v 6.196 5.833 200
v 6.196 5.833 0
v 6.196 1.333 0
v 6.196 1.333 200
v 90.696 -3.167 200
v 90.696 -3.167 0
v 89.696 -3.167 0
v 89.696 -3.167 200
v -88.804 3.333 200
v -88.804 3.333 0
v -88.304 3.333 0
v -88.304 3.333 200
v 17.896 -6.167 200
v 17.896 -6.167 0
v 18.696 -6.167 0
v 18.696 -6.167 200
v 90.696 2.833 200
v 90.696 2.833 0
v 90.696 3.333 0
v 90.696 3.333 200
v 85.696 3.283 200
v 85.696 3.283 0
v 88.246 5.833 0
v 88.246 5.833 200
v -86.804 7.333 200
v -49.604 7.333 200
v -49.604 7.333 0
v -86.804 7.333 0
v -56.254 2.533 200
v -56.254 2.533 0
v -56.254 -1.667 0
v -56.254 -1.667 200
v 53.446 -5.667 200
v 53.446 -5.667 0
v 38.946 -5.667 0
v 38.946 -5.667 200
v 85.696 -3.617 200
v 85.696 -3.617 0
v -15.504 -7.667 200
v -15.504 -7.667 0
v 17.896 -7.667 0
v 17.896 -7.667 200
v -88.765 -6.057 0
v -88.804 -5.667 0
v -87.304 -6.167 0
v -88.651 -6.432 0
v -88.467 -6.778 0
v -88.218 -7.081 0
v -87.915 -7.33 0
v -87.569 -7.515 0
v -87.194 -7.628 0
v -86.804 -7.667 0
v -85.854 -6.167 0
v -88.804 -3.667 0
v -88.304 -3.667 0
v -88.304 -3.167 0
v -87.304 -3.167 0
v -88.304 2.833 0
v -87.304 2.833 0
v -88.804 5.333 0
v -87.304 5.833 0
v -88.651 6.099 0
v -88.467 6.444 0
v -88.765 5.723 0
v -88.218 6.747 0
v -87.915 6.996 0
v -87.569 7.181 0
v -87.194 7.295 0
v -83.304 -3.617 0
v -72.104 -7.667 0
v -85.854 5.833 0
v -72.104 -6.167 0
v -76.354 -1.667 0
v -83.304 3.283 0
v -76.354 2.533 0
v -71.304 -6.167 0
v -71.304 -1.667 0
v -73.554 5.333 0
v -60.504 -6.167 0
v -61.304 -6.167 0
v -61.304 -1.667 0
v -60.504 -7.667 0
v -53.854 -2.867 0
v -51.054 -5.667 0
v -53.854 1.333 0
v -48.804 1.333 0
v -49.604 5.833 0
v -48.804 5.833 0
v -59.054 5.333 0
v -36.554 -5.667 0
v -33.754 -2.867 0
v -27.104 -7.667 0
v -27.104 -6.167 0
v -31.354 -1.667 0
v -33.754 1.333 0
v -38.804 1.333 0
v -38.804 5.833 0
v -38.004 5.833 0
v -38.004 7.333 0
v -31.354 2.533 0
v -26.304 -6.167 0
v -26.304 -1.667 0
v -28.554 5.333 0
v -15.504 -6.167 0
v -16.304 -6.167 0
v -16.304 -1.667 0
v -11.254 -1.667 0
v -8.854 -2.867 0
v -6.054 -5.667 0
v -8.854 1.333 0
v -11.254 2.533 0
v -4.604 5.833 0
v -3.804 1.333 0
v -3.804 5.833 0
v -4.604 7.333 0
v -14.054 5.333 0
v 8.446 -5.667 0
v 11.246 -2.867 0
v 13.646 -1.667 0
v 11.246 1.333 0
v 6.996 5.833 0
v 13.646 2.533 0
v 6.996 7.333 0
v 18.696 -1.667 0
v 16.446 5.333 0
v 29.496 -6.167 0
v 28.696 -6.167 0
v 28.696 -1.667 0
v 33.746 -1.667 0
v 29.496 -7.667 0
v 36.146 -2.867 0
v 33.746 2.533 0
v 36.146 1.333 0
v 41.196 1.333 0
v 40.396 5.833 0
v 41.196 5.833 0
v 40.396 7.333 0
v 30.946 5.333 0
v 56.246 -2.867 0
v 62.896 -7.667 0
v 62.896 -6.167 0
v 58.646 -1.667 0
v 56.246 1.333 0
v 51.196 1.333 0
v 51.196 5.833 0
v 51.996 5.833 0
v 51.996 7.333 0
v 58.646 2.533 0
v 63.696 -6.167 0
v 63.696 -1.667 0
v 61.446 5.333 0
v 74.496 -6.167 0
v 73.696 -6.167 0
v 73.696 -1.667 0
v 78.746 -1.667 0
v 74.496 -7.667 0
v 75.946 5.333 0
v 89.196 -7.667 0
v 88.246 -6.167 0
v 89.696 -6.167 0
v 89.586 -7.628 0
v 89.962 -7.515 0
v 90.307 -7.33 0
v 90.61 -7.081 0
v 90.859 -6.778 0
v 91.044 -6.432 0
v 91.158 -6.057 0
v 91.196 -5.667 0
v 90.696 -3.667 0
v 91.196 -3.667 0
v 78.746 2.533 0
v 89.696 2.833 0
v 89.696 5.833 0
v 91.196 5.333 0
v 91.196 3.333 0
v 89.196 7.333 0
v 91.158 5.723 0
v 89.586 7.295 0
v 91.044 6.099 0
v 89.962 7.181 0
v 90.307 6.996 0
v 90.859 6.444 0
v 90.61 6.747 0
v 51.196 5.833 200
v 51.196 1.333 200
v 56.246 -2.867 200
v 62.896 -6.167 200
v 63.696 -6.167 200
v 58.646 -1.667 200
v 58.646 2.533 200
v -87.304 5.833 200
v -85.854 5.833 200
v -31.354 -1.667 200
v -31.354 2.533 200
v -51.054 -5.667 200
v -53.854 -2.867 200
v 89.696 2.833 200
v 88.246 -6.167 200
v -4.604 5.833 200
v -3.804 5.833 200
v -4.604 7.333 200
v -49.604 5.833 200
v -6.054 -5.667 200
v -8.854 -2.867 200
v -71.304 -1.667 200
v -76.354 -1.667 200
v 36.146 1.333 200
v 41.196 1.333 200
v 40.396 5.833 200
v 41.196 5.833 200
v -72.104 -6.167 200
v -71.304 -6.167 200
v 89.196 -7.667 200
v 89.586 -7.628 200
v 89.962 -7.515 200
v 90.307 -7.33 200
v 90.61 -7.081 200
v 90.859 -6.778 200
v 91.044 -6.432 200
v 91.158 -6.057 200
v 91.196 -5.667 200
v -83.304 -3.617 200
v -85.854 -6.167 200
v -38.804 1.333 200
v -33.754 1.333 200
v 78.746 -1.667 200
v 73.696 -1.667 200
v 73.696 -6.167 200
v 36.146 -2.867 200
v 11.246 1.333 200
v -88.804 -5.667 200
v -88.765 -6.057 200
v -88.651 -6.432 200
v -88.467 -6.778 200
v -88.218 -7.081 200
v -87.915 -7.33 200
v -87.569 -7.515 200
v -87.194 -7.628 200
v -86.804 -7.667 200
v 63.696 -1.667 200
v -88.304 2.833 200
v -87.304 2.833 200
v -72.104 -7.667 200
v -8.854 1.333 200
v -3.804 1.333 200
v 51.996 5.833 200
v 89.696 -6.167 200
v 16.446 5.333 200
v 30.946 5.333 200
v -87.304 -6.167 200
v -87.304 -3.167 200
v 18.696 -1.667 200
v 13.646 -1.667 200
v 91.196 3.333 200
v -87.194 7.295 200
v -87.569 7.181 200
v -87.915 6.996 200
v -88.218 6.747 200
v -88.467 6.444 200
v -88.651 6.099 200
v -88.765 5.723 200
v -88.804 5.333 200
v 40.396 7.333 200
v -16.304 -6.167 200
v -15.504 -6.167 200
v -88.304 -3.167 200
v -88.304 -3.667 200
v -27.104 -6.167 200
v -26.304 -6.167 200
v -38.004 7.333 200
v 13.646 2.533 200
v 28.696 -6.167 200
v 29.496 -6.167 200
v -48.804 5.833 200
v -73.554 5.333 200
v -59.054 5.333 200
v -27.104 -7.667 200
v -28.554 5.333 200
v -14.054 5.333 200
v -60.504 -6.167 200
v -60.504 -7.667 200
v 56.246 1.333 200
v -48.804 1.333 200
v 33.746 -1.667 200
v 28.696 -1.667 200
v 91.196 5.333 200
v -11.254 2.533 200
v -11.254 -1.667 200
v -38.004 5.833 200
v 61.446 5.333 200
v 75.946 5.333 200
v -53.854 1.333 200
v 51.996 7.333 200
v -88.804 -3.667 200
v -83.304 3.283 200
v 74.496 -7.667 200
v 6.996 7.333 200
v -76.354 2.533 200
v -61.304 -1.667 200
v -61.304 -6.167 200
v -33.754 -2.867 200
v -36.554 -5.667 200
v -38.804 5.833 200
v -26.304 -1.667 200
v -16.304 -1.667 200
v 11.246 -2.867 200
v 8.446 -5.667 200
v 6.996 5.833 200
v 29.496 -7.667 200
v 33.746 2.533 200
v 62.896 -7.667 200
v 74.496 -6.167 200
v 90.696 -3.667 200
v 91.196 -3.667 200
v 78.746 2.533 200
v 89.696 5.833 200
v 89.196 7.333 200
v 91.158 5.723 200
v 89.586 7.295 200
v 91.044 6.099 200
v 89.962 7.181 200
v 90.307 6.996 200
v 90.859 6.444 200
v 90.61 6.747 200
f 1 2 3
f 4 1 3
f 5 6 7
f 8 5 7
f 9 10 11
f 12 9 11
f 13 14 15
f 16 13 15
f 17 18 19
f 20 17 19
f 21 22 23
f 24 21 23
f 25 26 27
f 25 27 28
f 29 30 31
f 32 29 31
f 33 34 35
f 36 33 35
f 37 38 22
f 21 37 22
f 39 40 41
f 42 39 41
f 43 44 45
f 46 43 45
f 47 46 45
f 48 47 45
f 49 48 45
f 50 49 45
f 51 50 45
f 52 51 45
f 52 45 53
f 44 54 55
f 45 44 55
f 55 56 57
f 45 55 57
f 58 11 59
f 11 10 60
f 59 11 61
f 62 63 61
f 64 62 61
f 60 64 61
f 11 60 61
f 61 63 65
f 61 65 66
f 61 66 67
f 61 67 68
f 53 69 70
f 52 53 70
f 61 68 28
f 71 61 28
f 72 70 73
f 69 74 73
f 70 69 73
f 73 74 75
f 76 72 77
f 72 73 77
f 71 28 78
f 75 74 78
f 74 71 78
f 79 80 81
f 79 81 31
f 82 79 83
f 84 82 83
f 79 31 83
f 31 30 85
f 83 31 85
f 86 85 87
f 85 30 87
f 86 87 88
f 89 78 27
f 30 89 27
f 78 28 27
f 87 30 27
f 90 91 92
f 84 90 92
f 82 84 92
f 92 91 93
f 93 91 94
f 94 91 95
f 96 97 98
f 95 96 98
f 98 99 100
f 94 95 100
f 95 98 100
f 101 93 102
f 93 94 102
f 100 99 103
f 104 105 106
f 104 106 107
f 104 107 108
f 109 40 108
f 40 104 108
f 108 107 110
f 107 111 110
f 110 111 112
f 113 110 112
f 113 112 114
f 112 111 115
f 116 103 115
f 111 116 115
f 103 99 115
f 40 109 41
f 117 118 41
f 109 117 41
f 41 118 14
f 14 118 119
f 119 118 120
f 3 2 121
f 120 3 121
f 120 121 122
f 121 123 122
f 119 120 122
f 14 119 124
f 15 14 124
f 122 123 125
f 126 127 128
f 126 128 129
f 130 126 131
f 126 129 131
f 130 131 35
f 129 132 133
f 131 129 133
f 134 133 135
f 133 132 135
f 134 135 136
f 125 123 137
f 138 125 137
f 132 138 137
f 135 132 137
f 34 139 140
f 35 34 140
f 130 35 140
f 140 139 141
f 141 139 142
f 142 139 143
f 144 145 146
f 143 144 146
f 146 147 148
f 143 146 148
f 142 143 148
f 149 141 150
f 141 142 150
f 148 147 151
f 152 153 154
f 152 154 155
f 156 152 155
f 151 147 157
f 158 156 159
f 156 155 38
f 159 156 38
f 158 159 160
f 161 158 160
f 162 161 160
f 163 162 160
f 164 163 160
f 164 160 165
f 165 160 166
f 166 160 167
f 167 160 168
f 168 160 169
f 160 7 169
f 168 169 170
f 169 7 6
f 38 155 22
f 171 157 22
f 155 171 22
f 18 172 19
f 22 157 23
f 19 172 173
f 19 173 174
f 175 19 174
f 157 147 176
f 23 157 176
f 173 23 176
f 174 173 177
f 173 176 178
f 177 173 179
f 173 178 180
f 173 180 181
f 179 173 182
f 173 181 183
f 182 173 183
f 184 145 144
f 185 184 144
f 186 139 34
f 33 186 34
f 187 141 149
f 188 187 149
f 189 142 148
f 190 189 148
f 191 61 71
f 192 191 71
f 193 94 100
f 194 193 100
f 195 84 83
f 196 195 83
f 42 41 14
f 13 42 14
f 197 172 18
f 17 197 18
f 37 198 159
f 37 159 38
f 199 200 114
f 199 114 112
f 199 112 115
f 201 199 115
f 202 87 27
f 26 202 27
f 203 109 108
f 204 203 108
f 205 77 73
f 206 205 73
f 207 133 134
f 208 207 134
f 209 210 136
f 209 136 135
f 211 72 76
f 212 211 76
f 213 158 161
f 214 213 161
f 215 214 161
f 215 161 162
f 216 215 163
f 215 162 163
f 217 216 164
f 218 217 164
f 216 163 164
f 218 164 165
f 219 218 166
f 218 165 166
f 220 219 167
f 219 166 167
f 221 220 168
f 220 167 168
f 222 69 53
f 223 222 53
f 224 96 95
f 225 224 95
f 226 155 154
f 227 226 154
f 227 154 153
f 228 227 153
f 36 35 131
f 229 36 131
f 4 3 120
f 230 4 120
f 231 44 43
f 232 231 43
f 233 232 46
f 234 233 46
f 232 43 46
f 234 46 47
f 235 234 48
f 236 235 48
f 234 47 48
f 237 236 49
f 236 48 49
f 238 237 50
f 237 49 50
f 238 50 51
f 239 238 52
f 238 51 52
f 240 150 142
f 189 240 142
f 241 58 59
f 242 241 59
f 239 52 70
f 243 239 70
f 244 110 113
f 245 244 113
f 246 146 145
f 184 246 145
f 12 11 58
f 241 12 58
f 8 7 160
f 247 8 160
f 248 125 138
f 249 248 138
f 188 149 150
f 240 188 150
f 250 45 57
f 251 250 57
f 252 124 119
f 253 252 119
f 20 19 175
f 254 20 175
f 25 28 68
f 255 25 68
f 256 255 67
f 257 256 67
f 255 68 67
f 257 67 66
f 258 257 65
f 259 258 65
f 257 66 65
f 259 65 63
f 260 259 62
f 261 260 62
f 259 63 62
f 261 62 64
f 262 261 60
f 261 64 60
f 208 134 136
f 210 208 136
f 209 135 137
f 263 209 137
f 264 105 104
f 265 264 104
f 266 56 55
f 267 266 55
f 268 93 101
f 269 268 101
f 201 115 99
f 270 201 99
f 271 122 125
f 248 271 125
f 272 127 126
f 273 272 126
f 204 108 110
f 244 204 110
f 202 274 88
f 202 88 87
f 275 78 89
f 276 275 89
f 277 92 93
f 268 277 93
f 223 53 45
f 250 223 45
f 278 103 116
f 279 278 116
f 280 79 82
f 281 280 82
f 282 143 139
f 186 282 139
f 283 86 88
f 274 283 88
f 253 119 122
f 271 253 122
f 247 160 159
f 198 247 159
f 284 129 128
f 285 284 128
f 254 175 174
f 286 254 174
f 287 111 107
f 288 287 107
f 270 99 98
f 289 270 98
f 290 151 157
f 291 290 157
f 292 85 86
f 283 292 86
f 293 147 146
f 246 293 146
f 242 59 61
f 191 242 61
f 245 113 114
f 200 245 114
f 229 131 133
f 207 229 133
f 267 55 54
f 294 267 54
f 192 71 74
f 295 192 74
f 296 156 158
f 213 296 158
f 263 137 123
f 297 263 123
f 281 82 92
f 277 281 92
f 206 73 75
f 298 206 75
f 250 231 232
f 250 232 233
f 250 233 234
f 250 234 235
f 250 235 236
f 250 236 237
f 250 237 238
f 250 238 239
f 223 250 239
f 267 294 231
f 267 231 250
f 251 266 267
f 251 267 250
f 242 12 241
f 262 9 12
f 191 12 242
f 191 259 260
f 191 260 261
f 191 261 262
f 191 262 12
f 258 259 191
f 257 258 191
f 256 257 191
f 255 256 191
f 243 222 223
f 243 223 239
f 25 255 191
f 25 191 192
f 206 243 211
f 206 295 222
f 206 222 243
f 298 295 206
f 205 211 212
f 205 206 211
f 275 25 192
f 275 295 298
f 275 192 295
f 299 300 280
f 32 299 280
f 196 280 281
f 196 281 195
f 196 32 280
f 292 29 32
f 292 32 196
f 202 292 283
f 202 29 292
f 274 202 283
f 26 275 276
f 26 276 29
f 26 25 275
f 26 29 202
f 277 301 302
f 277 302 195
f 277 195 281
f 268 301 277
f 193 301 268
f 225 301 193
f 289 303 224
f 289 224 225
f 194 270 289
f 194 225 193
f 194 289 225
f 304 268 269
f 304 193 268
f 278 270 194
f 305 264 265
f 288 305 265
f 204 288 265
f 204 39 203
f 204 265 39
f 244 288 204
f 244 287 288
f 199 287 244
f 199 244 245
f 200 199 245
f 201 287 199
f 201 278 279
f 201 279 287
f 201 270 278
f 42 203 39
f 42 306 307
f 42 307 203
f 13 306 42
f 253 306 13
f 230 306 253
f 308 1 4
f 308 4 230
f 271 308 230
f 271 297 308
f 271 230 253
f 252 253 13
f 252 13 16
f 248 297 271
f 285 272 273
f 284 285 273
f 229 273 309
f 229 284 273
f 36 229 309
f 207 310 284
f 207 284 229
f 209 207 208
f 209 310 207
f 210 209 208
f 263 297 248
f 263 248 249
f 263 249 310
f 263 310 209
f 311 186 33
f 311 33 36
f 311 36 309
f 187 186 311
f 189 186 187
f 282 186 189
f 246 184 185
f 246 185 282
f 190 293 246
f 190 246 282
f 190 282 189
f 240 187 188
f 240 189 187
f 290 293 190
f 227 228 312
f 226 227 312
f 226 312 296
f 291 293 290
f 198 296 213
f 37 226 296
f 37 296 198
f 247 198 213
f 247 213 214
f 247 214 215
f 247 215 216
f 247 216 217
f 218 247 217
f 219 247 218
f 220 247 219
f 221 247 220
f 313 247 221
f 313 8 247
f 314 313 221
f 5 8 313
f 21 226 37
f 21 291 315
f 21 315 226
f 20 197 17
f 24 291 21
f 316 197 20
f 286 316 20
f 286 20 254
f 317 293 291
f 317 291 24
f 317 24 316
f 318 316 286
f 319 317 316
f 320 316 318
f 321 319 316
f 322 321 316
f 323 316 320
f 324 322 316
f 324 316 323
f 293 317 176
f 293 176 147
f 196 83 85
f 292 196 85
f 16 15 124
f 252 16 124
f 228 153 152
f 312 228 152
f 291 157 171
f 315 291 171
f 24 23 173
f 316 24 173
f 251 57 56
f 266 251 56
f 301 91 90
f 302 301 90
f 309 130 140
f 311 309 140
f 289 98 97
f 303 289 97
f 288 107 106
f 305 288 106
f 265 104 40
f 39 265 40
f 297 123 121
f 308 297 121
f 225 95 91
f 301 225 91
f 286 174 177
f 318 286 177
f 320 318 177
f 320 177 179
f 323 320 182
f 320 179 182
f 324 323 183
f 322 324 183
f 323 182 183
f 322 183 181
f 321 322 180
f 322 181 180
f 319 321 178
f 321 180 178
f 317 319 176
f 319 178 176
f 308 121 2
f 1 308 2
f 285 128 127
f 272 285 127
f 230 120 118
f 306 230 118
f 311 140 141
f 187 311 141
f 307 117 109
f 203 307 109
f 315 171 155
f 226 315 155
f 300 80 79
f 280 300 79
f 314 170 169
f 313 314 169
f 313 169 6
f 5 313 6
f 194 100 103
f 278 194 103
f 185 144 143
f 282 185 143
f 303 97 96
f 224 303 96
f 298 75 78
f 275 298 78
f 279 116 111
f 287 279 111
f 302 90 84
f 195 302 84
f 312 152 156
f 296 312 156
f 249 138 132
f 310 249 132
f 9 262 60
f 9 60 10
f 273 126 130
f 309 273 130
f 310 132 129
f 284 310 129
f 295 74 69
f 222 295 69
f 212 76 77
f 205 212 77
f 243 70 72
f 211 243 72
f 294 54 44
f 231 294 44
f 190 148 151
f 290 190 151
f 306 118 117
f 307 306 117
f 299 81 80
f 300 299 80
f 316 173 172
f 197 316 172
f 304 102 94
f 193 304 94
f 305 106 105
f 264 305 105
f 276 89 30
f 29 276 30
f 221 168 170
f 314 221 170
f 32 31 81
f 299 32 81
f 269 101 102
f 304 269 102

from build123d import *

# Parameters (mm, degrees)
EXTRUDE_1_DEPTH = 200


with BuildPart() as part:
    # Эскиз1 → Бобышка-Вытянуть1 (new body)
    with BuildSketch(Plane.XY):
        with BuildLine():
            Line((-85.853717104, -6.166822364), (-87.303717104, -6.166822364))
            Line((-87.303717104, -6.166822364), (-87.303717104, -3.166822364))
            Line((-87.303717104, -3.166822364), (-88.303717104, -3.166822364))
            Line((-88.303717104, -3.166822364), (-88.303717104, -3.666822364))
            Line((-88.303717104, -3.666822364), (-88.803717104, -3.666822364))
            Line((-88.803717104, -3.666822364), (-88.803717104, -5.666822356))
            ThreePointArc((-88.803717104, -5.666822356), (-88.217930664, -7.081035924), (-86.803717096, -7.666822364))
            Line((-86.803717096, -7.666822364), (-72.103717104, -7.666822364))
            Line((-72.103717104, -7.666822364), (-72.103717104, -6.166822364))
            Line((-72.103717104, -6.166822364), (-71.303717104, -6.166822364))
            Line((-71.303717104, -6.166822364), (-71.303717104, -1.666822364))
            Line((-71.303717104, -1.666822364), (-76.353717104, -1.666822364))
            Line((-76.353717104, -1.666822364), (-76.353717104, 2.533177636))
            Line((-76.353717104, 2.533177636), (-73.553717104, 5.333177636))
            Line((-73.553717104, 5.333177636), (-59.053717104, 5.333177636))
            Line((-59.053717104, 5.333177636), (-56.253717104, 2.533177636))
            Line((-56.253717104, 2.533177636), (-56.253717104, -1.666822364))
            Line((-56.253717104, -1.666822364), (-61.303717104, -1.666822364))
            Line((-61.303717104, -1.666822364), (-61.303717104, -6.166822364))
            Line((-61.303717104, -6.166822364), (-60.503717104, -6.166822364))
            Line((-60.503717104, -6.166822364), (-60.503717104, -7.666822364))
            Line((-60.503717104, -7.666822364), (-27.103717104, -7.666822364))
            Line((-27.103717104, -7.666822364), (-27.103717104, -6.166822364))
            Line((-27.103717104, -6.166822364), (-26.303717104, -6.166822364))
            Line((-26.303717104, -6.166822364), (-26.303717104, -1.666822364))
            Line((-26.303717104, -1.666822364), (-31.353717104, -1.666822364))
            Line((-31.353717104, -1.666822364), (-31.353717104, 2.533177636))
            Line((-31.353717104, 2.533177636), (-28.553717104, 5.333177636))
            Line((-28.553717104, 5.333177636), (-14.053717104, 5.333177636))
            Line((-14.053717104, 5.333177636), (-11.253717104, 2.533177636))
            Line((-11.253717104, 2.533177636), (-11.253717104, -1.666822364))
            Line((-11.253717104, -1.666822364), (-16.303717104, -1.666822364))
            Line((-16.303717104, -1.666822364), (-16.303717104, -6.166822364))
            Line((-16.303717104, -6.166822364), (-15.503717104, -6.166822364))
            Line((-15.503717104, -6.166822364), (-15.503717104, -7.666822364))
            Line((-15.503717104, -7.666822364), (17.896282896, -7.666822364))
            Line((17.896282896, -7.666822364), (17.896282896, -6.166822364))
            Line((17.896282896, -6.166822364), (18.696282896, -6.166822364))
            Line((18.696282896, -6.166822364), (18.696282896, -1.666822364))
            Line((18.696282896, -1.666822364), (13.646282896, -1.666822364))
            Line((13.646282896, -1.666822364), (13.646282896, 2.533177636))
            Line((13.646282896, 2.533177636), (16.446282896, 5.333177636))
            Line((16.446282896, 5.333177636), (30.946282896, 5.333177636))
            Line((30.946282896, 5.333177636), (33.746282896, 2.533177636))
            Line((33.746282896, 2.533177636), (33.746282896, -1.666822364))
            Line((33.746282896, -1.666822364), (28.696282896, -1.666822364))
            Line((28.696282896, -1.666822364), (28.696282896, -6.166822364))
            Line((28.696282896, -6.166822364), (29.496282896, -6.166822364))
            Line((29.496282896, -6.166822364), (29.496282896, -7.666822364))
            Line((29.496282896, -7.666822364), (62.896282896, -7.666822364))
            Line((62.896282896, -7.666822364), (62.896282896, -6.166822364))
            Line((62.896282896, -6.166822364), (63.696282896, -6.166822364))
            Line((63.696282896, -6.166822364), (63.696282896, -1.666822364))
            Line((63.696282896, -1.666822364), (58.646282896, -1.666822364))
            Line((58.646282896, -1.666822364), (58.646282896, 2.533177636))
            Line((58.646282896, 2.533177636), (61.446282896, 5.333177636))
            Line((61.446282896, 5.333177636), (75.946282896, 5.333177636))
            Line((75.946282896, 5.333177636), (78.746282896, 2.533177636))
            Line((78.746282896, 2.533177636), (78.746282896, -1.666822364))
            Line((78.746282896, -1.666822364), (73.696282896, -1.666822364))
            Line((73.696282896, -1.666822364), (73.696282896, -6.166822364))
            Line((73.696282896, -6.166822364), (74.496282896, -6.166822364))
            Line((74.496282896, -6.166822364), (74.496282896, -7.666822364))
            Line((74.496282896, -7.666822364), (89.196282888, -7.666822364))
            ThreePointArc((89.196282888, -7.666822364), (90.610496456, -7.081035924), (91.196282896, -5.666822356))
            Line((91.196282896, -5.666822356), (91.196282896, -3.666822364))
            Line((91.196282896, -3.666822364), (90.696282896, -3.666822364))
            Line((90.696282896, -3.666822364), (90.696282896, -3.166822364))
            Line((90.696282896, -3.166822364), (89.696282896, -3.166822364))
            Line((89.696282896, -3.166822364), (89.696282896, -6.166822364))
            Line((89.696282896, -6.166822364), (88.246282896, -6.166822364))
            Line((88.246282896, -6.166822364), (85.696282896, -3.616822364))
            Line((85.696282896, -3.616822364), (85.696282896, 3.283177636))
            Line((85.696282896, 3.283177636), (88.246282896, 5.833177636))
            Line((88.246282896, 5.833177636), (89.696282896, 5.833177636))
            Line((89.696282896, 5.833177636), (89.696282896, 2.833177636))
            Line((89.696282896, 2.833177636), (90.696282896, 2.833177636))
            Line((90.696282896, 2.833177636), (90.696282896, 3.333177636))
            Line((90.696282896, 3.333177636), (91.196282896, 3.333177636))
            Line((91.196282896, 3.333177636), (91.196282896, 5.333177628))
            ThreePointArc((91.196282896, 5.333177628), (90.610496456, 6.747391196), (89.196282888, 7.333177636))
            Line((89.196282888, 7.333177636), (51.996282896, 7.333177636))
            Line((51.996282896, 7.333177636), (51.996282896, 5.833177636))
            Line((51.996282896, 5.833177636), (51.196282898, 5.833177636))
            Line((51.196282898, 5.833177636), (51.196282898, 1.333177634))
            Line((51.196282898, 1.333177634), (56.246282898, 1.333177634))
            Line((56.246282898, 1.333177634), (56.246282898, -2.866822366))
            Line((56.246282898, -2.866822366), (53.446282898, -5.666822366))
            Line((53.446282898, -5.666822366), (38.946282898, -5.666822366))
            Line((38.946282898, -5.666822366), (36.146282898, -2.866822366))
            Line((36.146282898, -2.866822366), (36.146282898, 1.333177634))
            Line((36.146282898, 1.333177634), (41.196282898, 1.333177634))
            Line((41.196282898, 1.333177634), (41.196282898, 5.833177636))
            Line((41.196282898, 5.833177636), (40.396282896, 5.833177636))
            Line((40.396282896, 5.833177636), (40.396282896, 7.333177636))
            Line((40.396282896, 7.333177636), (6.996282896, 7.333177636))
            Line((6.996282896, 7.333177636), (6.996282896, 5.833177636))
            Line((6.996282896, 5.833177636), (6.196282898, 5.833177636))
            Line((6.196282898, 5.833177636), (6.196282898, 1.333177634))
            Line((6.196282898, 1.333177634), (11.246282898, 1.333177634))
            Line((11.246282898, 1.333177634), (11.246282898, -2.866822366))
            Line((11.246282898, -2.866822366), (8.446282898, -5.666822366))
            Line((8.446282898, -5.666822366), (-6.053717102, -5.666822366))
            Line((-6.053717102, -5.666822366), (-8.853717102, -2.866822366))
            Line((-8.853717102, -2.866822366), (-8.853717102, 1.333177634))
            Line((-8.853717102, 1.333177634), (-3.803717102, 1.333177634))
            Line((-3.803717102, 1.333177634), (-3.803717102, 5.833177636))
            Line((-3.803717102, 5.833177636), (-4.603717104, 5.833177636))
            Line((-4.603717104, 5.833177636), (-4.603717104, 7.333177636))
            Line((-4.603717104, 7.333177636), (-38.003717104, 7.333177636))
            Line((-38.003717104, 7.333177636), (-38.003717104, 5.833177636))
            Line((-38.003717104, 5.833177636), (-38.803717102, 5.833177636))
            Line((-38.803717102, 5.833177636), (-38.803717102, 1.333177634))
            Line((-38.803717102, 1.333177634), (-33.753717102, 1.333177634))
            Line((-33.753717102, 1.333177634), (-33.753717102, -2.866822366))
            Line((-33.753717102, -2.866822366), (-36.553717102, -5.666822366))
            Line((-36.553717102, -5.666822366), (-51.053717102, -5.666822366))
            Line((-51.053717102, -5.666822366), (-53.853717102, -2.866822366))
            Line((-53.853717102, -2.866822366), (-53.853717102, 1.333177634))
            Line((-53.853717102, 1.333177634), (-48.803717102, 1.333177634))
            Line((-48.803717102, 1.333177634), (-48.803717102, 5.833177636))
            Line((-48.803717102, 5.833177636), (-49.603717104, 5.833177636))
            Line((-49.603717104, 5.833177636), (-49.603717104, 7.333177636))
            Line((-49.603717104, 7.333177636), (-86.803717096, 7.333177636))
            ThreePointArc((-86.803717096, 7.333177636), (-88.217930664, 6.747391196), (-88.803717104, 5.333177628))
            Line((-88.803717104, 5.333177628), (-88.803717104, 3.333177636))
            Line((-88.803717104, 3.333177636), (-88.303717104, 3.333177636))
            Line((-88.303717104, 3.333177636), (-88.303717104, 2.833177636))
            Line((-88.303717104, 2.833177636), (-87.303717104, 2.833177636))
            Line((-87.303717104, 2.833177636), (-87.303717104, 5.833177636))
            Line((-87.303717104, 5.833177636), (-85.853717104, 5.833177636))
            Line((-85.853717104, 5.833177636), (-83.303717104, 3.283177636))
            Line((-83.303717104, 3.283177636), (-83.303717104, -3.616822364))
            Line((-83.303717104, -3.616822364), (-85.853717104, -6.166822364))
        make_face()
    extrude(amount=EXTRUDE_1_DEPTH)


solid = part.part
